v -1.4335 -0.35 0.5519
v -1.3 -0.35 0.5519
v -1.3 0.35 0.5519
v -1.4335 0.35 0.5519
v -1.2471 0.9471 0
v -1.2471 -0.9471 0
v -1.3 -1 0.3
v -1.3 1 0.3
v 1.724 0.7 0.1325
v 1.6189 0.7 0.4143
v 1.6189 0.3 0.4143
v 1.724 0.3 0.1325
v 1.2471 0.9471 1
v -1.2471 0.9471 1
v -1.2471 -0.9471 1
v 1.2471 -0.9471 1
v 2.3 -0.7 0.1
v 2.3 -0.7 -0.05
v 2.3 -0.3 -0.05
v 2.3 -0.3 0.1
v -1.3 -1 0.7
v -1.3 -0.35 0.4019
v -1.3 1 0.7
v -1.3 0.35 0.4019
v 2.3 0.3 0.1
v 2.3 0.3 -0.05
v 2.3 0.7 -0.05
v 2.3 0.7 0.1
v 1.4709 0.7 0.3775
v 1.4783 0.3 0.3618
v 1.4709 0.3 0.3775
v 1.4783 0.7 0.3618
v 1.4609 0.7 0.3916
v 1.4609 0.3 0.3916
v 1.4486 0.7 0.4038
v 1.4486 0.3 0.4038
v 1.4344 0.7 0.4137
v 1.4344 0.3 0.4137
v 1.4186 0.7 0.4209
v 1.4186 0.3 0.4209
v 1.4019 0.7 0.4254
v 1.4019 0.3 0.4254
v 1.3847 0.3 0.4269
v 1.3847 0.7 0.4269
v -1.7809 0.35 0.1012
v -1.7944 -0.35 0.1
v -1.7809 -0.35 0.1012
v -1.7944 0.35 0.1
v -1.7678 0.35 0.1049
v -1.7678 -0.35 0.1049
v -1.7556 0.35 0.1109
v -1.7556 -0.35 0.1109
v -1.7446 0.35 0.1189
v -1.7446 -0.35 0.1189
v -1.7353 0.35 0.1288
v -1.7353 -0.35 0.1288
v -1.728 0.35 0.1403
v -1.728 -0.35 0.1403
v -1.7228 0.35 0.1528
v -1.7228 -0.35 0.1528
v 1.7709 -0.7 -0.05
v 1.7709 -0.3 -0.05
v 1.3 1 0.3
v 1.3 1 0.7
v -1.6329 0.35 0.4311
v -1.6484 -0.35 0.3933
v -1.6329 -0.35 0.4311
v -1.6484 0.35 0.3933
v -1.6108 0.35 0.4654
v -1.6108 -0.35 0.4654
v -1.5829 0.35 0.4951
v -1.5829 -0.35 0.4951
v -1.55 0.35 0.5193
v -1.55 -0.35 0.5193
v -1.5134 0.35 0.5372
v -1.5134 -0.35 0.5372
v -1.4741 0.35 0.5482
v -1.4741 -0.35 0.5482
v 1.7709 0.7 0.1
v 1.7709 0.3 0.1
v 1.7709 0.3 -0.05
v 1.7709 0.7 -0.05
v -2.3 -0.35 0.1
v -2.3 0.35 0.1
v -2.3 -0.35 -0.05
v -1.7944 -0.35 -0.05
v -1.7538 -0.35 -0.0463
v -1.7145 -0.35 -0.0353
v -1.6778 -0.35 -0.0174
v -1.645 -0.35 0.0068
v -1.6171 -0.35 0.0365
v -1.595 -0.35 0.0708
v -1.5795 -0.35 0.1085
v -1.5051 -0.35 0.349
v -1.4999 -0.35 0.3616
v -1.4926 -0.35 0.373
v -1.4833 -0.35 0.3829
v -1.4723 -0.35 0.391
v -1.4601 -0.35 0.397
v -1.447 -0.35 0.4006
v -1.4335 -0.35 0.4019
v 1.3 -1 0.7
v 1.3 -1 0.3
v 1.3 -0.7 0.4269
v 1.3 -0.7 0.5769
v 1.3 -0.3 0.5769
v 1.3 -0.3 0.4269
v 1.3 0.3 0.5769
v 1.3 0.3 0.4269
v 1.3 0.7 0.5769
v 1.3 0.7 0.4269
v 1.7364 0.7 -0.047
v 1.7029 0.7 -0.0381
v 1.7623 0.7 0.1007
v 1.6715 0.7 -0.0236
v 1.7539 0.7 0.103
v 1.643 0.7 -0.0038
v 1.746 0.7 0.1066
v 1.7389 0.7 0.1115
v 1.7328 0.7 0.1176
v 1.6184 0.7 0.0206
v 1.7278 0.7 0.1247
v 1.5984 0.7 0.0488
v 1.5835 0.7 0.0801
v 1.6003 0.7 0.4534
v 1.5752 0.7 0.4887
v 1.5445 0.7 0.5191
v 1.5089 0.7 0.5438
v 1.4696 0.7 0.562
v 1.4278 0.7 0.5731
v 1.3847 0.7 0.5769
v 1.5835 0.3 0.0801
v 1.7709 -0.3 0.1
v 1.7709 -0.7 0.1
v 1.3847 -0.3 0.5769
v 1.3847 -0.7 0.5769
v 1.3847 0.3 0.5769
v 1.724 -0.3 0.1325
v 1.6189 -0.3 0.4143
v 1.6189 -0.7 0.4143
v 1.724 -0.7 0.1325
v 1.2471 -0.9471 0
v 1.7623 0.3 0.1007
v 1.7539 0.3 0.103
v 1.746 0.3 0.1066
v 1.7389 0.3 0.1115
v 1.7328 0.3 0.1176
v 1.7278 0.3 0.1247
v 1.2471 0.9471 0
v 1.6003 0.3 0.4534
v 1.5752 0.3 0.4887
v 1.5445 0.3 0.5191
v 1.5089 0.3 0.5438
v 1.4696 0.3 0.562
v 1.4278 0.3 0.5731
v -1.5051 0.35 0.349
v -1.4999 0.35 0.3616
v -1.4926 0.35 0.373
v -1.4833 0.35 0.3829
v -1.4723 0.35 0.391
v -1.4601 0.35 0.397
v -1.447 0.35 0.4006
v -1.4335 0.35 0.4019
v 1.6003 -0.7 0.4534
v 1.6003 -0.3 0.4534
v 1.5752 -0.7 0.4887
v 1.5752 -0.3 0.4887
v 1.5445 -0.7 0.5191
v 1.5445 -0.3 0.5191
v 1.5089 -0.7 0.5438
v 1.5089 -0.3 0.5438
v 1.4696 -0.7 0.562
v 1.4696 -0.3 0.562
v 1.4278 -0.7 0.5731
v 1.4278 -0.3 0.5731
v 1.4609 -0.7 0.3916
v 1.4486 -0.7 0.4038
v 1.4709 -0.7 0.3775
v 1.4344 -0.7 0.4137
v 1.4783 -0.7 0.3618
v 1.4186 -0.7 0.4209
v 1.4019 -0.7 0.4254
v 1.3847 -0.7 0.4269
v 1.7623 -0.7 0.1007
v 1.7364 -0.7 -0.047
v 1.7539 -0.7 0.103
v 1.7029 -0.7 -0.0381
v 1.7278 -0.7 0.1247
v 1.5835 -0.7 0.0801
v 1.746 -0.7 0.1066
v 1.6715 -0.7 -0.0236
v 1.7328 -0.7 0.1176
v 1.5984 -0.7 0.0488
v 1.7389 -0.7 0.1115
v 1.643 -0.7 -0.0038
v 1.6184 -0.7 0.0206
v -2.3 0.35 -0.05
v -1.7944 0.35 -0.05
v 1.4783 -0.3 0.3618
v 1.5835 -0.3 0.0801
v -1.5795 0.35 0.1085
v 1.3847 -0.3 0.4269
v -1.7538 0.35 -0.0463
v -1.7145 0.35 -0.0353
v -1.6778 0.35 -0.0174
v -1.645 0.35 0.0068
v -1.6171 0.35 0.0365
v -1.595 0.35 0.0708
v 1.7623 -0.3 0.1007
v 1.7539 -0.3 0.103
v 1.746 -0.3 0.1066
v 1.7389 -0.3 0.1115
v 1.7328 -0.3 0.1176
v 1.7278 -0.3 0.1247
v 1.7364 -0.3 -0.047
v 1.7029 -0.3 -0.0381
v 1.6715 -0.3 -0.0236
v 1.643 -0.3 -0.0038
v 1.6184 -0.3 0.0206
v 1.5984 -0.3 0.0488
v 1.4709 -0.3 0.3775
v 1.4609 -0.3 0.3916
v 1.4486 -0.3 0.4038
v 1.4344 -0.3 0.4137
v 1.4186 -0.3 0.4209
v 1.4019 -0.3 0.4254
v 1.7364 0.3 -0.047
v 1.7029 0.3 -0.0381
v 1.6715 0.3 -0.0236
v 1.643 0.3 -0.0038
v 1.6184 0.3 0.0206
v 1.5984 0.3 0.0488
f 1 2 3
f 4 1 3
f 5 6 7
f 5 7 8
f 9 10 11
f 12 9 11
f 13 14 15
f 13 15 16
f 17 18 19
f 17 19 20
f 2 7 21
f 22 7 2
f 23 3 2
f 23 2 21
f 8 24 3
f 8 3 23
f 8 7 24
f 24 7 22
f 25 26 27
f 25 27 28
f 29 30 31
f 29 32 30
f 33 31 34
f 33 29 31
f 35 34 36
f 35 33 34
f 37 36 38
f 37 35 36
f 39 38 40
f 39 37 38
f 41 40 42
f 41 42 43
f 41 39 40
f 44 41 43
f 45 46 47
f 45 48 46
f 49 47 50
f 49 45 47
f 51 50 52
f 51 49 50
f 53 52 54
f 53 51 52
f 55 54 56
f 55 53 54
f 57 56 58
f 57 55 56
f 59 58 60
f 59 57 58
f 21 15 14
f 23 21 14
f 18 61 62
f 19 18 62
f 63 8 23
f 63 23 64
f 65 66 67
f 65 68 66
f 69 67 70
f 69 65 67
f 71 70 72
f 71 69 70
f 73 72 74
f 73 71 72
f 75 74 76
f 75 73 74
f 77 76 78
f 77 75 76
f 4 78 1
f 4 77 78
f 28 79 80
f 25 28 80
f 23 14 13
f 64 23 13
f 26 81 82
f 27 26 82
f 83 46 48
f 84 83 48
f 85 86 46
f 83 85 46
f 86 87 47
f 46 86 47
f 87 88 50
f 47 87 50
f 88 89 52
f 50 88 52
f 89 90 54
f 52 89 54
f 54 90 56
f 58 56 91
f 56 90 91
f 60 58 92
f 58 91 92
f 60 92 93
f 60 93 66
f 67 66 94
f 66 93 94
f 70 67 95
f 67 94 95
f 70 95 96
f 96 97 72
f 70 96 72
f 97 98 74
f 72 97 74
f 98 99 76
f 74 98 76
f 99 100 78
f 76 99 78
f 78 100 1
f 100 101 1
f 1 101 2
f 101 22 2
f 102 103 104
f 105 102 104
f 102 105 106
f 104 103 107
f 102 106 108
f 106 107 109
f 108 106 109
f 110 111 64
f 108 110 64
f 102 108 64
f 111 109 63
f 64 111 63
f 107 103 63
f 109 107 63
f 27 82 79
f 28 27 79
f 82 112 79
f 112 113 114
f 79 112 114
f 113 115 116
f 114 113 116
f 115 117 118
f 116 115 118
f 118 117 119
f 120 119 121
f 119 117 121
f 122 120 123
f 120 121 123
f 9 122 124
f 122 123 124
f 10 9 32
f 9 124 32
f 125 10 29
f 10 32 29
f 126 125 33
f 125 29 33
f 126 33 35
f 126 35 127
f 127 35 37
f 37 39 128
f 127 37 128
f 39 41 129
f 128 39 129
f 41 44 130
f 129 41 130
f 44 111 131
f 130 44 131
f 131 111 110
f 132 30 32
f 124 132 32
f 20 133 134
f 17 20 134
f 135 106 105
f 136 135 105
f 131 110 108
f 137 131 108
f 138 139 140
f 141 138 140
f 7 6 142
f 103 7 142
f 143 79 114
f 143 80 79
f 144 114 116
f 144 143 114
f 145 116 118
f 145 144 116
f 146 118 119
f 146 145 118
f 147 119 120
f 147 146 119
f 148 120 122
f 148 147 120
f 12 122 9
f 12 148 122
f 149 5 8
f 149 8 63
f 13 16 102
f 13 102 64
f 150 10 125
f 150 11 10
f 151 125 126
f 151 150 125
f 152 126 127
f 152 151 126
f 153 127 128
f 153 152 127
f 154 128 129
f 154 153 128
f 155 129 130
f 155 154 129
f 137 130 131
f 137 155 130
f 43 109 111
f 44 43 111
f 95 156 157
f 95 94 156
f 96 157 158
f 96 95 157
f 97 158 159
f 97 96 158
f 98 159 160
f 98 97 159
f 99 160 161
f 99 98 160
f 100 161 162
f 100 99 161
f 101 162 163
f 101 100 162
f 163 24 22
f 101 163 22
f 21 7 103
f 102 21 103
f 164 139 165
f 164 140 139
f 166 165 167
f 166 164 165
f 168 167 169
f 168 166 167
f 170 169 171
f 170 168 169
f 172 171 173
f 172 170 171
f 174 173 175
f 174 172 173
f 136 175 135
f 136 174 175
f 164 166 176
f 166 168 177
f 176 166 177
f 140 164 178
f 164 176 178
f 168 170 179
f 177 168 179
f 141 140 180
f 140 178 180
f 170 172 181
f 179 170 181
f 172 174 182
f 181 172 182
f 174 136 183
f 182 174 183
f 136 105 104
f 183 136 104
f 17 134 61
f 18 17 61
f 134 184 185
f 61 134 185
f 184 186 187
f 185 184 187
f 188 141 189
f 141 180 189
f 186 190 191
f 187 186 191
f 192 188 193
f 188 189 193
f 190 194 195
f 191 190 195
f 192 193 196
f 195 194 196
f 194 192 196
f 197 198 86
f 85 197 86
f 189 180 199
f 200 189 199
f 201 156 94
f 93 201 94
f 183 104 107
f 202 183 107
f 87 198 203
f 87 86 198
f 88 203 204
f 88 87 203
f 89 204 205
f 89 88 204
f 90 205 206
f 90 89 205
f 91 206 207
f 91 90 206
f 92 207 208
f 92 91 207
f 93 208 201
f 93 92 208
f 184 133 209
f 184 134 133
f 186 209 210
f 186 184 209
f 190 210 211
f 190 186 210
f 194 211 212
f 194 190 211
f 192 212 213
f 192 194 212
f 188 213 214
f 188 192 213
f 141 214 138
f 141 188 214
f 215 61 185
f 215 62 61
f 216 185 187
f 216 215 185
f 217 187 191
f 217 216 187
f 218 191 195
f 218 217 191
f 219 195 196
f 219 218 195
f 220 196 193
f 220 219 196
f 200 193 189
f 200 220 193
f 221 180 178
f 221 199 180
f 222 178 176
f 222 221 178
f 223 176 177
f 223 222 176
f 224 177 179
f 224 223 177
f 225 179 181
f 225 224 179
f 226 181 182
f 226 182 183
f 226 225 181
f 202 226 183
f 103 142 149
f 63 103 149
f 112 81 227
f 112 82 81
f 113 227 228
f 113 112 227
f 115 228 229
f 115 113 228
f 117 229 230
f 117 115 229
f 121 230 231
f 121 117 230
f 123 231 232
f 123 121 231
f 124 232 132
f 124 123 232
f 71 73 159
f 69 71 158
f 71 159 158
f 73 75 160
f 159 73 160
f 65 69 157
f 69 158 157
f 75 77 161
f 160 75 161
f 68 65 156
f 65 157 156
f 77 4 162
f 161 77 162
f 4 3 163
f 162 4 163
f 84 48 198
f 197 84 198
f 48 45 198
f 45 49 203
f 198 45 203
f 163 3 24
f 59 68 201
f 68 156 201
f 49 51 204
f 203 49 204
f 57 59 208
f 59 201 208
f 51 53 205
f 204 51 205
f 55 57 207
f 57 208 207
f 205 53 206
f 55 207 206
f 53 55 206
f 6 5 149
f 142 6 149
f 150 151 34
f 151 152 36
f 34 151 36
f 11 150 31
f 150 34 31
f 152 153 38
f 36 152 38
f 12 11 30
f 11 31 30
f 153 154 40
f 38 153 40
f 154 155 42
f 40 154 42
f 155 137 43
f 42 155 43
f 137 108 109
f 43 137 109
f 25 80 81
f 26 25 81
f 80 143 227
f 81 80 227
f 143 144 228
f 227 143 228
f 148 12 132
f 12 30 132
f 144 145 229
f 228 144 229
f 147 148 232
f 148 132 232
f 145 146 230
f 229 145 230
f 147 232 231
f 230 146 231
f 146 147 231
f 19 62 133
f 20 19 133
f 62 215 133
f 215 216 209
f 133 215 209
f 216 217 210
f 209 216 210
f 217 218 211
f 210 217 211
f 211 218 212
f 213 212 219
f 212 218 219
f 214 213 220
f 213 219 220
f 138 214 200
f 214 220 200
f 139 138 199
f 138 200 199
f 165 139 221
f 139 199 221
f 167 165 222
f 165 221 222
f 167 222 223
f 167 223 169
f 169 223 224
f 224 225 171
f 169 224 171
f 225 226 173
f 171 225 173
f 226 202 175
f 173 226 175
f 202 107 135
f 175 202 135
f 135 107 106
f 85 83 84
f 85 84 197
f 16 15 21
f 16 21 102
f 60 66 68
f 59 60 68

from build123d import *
from OCP.BRepFilletAPI import BRepFilletAPI_MakeChamfer

# Parameters (mm, degrees)
SKETCH1_W           = 2.6
SKETCH1_H           = 2
BOSS_EXTRUDE1_DEPTH = 1
SKETCH2_W           = 0.15
SKETCH2_H           = 0.7
SKETCH4_W           = 0.15
SKETCH4_H           = 0.4
LPATTERN1_COUNT     = 2
LPATTERN1_PITCH     = 1
CHAMFER1_SIZE       = 0.3
CHAMFER1_SIZE2      = 0.052898094
CHAMFER3_SIZE       = 0.3
CHAMFER3_SIZE2      = 0.052898094


with BuildPart() as part:
    # Sketch1 → Boss-Extrude1 (new body)
    with BuildSketch(Plane.XY):
        Rectangle(SKETCH1_W, SKETCH1_H)
    extrude(amount=BOSS_EXTRUDE1_DEPTH)

    # Sweep1: sweep along a path in Sketch3
    with BuildLine(Plane(origin=(0, 0, 0), x_dir=(1, 0, 0), z_dir=(0, 1, 0))) as sweep1_path:
        Line((-2.3, -0.025), (-1.79443196, -0.025))
        ThreePointArc((-1.79443196, -0.025), (-1.705398673, -0.054281012), (-1.651125184, -0.130692347))
        Line((-1.651125184, -0.130692347), (-1.576770506, -0.371181935))
        ThreePointArc((-1.576770506, -0.371181935), (-1.522497017, -0.44759327), (-1.433463731, -0.476874282))
        Line((-1.433463731, -0.476874282), (-0.426220015, -0.476874282))
    # Sketch2 → Sweep1 (sweep)
    with BuildSketch(Plane.ZY.offset(2.3)):
        with Locations((0.025, 0)):
            Rectangle(SKETCH2_W, SKETCH2_H)
    sweep(path=sweep1_path.line)

    # Sweep3: sweep along a path in Sketch5
    with BuildLine(Plane(origin=(0, -0.5, 0), x_dir=(1, 0, 0), z_dir=(0, 1, 0))) as sweep3_path:
        Line((2.3, 0), (1.770889152, 0))
        ThreePointArc((1.770889152, 0), (1.685353834, -0.026777805), (1.630357823, -0.097550541))
        Line((1.630357823, -0.097550541), (1.525193715, -0.379323741))
        ThreePointArc((1.525193715, -0.379323741), (1.470197705, -0.450096477), (1.384662387, -0.476874282))
        Line((1.384662387, -0.476874282), (0.631515544, -0.476874282))
    # Sketch4 → Sweep3 (sweep)
    with BuildSketch(Plane(origin=(2.3, 0, 0), x_dir=(0, 0, -1), z_dir=(1, 0, 0))):
        with Locations((-0.025, -0.5)):
            Rectangle(SKETCH4_W, SKETCH4_H)
    sweep3 = sweep(path=sweep3_path.line)

    # LPattern1: Sweep3 ×2
    with Locations(*[(0, i * LPATTERN1_PITCH, 0) for i in range(1, LPATTERN1_COUNT)]):
        add(sweep3)

    # Chamfer1: one chamfer whose edges measure the first distance from different faces: ONE call of the kernel's chamfer builder (chamfer() names one face for all edges)
    chamfer1_edges_1 = [part.edges().sort_by_distance(p)[0] for p in [
        (0, 1, 1),
    ]]
    chamfer1_side_1 = [part.faces().sort_by_distance(p)[0] for p in [
        (0, 1, 0.5),
    ]]
    chamfer1_edges_2 = [part.edges().sort_by_distance(p)[0] for p in [
        (-1.3, 0, 1),
    ]]
    chamfer1_side_2 = [part.faces().sort_by_distance(p)[0] for p in [
        (-1.3, 0.97763932, 0.5),
    ]]
    chamfer1_edges_3 = [part.edges().sort_by_distance(p)[0] for p in [
        (0, -1, 1),
    ]]
    chamfer1_side_3 = [part.faces().sort_by_distance(p)[0] for p in [
        (0, -1, 0.5),
    ]]
    chamfer1_edges_4 = [part.edges().sort_by_distance(p)[0] for p in [
        (1.3, 0, 1),
    ]]
    chamfer1_side_4 = [part.faces().sort_by_distance(p)[0] for p in [
        (1.3, 0, 0.499880365),
    ]]
    chamfer1 = BRepFilletAPI_MakeChamfer(part.part.solid().wrapped)
    for e in chamfer1_edges_1:
        chamfer1.Add(CHAMFER1_SIZE, CHAMFER1_SIZE2, e.wrapped, chamfer1_side_1[0].wrapped)  # the first distance lies on this face
    for e in chamfer1_edges_2:
        chamfer1.Add(CHAMFER1_SIZE, CHAMFER1_SIZE2, e.wrapped, chamfer1_side_2[0].wrapped)  # the first distance lies on this face
    for e in chamfer1_edges_3:
        chamfer1.Add(CHAMFER1_SIZE, CHAMFER1_SIZE2, e.wrapped, chamfer1_side_3[0].wrapped)  # the first distance lies on this face
    for e in chamfer1_edges_4:
        chamfer1.Add(CHAMFER1_SIZE, CHAMFER1_SIZE2, e.wrapped, chamfer1_side_4[0].wrapped)  # the first distance lies on this face
    add(Compound.cast(chamfer1.Shape()), mode=Mode.REPLACE)

    # Chamfer3: one chamfer whose edges measure the first distance from different faces: ONE call of the kernel's chamfer builder (chamfer() names one face for all edges)
    chamfer3_edges_1 = [part.edges().sort_by_distance(p)[0] for p in [
        (-1.3, 0, 0),
    ]]
    chamfer3_side_1 = [part.faces().sort_by_distance(p)[0] for p in [
        (-1.3, 0, 0.339712896),
    ]]
    chamfer3_edges_2 = [part.edges().sort_by_distance(p)[0] for p in [
        (0, 1, 0),
    ]]
    chamfer3_side_2 = [part.faces().sort_by_distance(p)[0] for p in [
        (0, 1, 0.35),
    ]]
    chamfer3_edges_3 = [part.edges().sort_by_distance(p)[0] for p in [
        (1.3, 0, 0),
    ]]
    chamfer3_side_3 = [part.faces().sort_by_distance(p)[0] for p in [
        (1.3, 0, 0.335761786),
    ]]
    chamfer3_edges_4 = [part.edges().sort_by_distance(p)[0] for p in [
        (0, -1, 0),
    ]]
    chamfer3_side_4 = [part.faces().sort_by_distance(p)[0] for p in [
        (0, -1, 0.35),
    ]]
    chamfer3 = BRepFilletAPI_MakeChamfer(part.part.solid().wrapped)
    for e in chamfer3_edges_1:
        chamfer3.Add(CHAMFER3_SIZE, CHAMFER3_SIZE2, e.wrapped, chamfer3_side_1[0].wrapped)  # the first distance lies on this face
    for e in chamfer3_edges_2:
        chamfer3.Add(CHAMFER3_SIZE, CHAMFER3_SIZE2, e.wrapped, chamfer3_side_2[0].wrapped)  # the first distance lies on this face
    for e in chamfer3_edges_3:
        chamfer3.Add(CHAMFER3_SIZE, CHAMFER3_SIZE2, e.wrapped, chamfer3_side_3[0].wrapped)  # the first distance lies on this face
    for e in chamfer3_edges_4:
        chamfer3.Add(CHAMFER3_SIZE, CHAMFER3_SIZE2, e.wrapped, chamfer3_side_4[0].wrapped)  # the first distance lies on this face
    add(Compound.cast(chamfer3.Shape()), mode=Mode.REPLACE)


solid = part.part
